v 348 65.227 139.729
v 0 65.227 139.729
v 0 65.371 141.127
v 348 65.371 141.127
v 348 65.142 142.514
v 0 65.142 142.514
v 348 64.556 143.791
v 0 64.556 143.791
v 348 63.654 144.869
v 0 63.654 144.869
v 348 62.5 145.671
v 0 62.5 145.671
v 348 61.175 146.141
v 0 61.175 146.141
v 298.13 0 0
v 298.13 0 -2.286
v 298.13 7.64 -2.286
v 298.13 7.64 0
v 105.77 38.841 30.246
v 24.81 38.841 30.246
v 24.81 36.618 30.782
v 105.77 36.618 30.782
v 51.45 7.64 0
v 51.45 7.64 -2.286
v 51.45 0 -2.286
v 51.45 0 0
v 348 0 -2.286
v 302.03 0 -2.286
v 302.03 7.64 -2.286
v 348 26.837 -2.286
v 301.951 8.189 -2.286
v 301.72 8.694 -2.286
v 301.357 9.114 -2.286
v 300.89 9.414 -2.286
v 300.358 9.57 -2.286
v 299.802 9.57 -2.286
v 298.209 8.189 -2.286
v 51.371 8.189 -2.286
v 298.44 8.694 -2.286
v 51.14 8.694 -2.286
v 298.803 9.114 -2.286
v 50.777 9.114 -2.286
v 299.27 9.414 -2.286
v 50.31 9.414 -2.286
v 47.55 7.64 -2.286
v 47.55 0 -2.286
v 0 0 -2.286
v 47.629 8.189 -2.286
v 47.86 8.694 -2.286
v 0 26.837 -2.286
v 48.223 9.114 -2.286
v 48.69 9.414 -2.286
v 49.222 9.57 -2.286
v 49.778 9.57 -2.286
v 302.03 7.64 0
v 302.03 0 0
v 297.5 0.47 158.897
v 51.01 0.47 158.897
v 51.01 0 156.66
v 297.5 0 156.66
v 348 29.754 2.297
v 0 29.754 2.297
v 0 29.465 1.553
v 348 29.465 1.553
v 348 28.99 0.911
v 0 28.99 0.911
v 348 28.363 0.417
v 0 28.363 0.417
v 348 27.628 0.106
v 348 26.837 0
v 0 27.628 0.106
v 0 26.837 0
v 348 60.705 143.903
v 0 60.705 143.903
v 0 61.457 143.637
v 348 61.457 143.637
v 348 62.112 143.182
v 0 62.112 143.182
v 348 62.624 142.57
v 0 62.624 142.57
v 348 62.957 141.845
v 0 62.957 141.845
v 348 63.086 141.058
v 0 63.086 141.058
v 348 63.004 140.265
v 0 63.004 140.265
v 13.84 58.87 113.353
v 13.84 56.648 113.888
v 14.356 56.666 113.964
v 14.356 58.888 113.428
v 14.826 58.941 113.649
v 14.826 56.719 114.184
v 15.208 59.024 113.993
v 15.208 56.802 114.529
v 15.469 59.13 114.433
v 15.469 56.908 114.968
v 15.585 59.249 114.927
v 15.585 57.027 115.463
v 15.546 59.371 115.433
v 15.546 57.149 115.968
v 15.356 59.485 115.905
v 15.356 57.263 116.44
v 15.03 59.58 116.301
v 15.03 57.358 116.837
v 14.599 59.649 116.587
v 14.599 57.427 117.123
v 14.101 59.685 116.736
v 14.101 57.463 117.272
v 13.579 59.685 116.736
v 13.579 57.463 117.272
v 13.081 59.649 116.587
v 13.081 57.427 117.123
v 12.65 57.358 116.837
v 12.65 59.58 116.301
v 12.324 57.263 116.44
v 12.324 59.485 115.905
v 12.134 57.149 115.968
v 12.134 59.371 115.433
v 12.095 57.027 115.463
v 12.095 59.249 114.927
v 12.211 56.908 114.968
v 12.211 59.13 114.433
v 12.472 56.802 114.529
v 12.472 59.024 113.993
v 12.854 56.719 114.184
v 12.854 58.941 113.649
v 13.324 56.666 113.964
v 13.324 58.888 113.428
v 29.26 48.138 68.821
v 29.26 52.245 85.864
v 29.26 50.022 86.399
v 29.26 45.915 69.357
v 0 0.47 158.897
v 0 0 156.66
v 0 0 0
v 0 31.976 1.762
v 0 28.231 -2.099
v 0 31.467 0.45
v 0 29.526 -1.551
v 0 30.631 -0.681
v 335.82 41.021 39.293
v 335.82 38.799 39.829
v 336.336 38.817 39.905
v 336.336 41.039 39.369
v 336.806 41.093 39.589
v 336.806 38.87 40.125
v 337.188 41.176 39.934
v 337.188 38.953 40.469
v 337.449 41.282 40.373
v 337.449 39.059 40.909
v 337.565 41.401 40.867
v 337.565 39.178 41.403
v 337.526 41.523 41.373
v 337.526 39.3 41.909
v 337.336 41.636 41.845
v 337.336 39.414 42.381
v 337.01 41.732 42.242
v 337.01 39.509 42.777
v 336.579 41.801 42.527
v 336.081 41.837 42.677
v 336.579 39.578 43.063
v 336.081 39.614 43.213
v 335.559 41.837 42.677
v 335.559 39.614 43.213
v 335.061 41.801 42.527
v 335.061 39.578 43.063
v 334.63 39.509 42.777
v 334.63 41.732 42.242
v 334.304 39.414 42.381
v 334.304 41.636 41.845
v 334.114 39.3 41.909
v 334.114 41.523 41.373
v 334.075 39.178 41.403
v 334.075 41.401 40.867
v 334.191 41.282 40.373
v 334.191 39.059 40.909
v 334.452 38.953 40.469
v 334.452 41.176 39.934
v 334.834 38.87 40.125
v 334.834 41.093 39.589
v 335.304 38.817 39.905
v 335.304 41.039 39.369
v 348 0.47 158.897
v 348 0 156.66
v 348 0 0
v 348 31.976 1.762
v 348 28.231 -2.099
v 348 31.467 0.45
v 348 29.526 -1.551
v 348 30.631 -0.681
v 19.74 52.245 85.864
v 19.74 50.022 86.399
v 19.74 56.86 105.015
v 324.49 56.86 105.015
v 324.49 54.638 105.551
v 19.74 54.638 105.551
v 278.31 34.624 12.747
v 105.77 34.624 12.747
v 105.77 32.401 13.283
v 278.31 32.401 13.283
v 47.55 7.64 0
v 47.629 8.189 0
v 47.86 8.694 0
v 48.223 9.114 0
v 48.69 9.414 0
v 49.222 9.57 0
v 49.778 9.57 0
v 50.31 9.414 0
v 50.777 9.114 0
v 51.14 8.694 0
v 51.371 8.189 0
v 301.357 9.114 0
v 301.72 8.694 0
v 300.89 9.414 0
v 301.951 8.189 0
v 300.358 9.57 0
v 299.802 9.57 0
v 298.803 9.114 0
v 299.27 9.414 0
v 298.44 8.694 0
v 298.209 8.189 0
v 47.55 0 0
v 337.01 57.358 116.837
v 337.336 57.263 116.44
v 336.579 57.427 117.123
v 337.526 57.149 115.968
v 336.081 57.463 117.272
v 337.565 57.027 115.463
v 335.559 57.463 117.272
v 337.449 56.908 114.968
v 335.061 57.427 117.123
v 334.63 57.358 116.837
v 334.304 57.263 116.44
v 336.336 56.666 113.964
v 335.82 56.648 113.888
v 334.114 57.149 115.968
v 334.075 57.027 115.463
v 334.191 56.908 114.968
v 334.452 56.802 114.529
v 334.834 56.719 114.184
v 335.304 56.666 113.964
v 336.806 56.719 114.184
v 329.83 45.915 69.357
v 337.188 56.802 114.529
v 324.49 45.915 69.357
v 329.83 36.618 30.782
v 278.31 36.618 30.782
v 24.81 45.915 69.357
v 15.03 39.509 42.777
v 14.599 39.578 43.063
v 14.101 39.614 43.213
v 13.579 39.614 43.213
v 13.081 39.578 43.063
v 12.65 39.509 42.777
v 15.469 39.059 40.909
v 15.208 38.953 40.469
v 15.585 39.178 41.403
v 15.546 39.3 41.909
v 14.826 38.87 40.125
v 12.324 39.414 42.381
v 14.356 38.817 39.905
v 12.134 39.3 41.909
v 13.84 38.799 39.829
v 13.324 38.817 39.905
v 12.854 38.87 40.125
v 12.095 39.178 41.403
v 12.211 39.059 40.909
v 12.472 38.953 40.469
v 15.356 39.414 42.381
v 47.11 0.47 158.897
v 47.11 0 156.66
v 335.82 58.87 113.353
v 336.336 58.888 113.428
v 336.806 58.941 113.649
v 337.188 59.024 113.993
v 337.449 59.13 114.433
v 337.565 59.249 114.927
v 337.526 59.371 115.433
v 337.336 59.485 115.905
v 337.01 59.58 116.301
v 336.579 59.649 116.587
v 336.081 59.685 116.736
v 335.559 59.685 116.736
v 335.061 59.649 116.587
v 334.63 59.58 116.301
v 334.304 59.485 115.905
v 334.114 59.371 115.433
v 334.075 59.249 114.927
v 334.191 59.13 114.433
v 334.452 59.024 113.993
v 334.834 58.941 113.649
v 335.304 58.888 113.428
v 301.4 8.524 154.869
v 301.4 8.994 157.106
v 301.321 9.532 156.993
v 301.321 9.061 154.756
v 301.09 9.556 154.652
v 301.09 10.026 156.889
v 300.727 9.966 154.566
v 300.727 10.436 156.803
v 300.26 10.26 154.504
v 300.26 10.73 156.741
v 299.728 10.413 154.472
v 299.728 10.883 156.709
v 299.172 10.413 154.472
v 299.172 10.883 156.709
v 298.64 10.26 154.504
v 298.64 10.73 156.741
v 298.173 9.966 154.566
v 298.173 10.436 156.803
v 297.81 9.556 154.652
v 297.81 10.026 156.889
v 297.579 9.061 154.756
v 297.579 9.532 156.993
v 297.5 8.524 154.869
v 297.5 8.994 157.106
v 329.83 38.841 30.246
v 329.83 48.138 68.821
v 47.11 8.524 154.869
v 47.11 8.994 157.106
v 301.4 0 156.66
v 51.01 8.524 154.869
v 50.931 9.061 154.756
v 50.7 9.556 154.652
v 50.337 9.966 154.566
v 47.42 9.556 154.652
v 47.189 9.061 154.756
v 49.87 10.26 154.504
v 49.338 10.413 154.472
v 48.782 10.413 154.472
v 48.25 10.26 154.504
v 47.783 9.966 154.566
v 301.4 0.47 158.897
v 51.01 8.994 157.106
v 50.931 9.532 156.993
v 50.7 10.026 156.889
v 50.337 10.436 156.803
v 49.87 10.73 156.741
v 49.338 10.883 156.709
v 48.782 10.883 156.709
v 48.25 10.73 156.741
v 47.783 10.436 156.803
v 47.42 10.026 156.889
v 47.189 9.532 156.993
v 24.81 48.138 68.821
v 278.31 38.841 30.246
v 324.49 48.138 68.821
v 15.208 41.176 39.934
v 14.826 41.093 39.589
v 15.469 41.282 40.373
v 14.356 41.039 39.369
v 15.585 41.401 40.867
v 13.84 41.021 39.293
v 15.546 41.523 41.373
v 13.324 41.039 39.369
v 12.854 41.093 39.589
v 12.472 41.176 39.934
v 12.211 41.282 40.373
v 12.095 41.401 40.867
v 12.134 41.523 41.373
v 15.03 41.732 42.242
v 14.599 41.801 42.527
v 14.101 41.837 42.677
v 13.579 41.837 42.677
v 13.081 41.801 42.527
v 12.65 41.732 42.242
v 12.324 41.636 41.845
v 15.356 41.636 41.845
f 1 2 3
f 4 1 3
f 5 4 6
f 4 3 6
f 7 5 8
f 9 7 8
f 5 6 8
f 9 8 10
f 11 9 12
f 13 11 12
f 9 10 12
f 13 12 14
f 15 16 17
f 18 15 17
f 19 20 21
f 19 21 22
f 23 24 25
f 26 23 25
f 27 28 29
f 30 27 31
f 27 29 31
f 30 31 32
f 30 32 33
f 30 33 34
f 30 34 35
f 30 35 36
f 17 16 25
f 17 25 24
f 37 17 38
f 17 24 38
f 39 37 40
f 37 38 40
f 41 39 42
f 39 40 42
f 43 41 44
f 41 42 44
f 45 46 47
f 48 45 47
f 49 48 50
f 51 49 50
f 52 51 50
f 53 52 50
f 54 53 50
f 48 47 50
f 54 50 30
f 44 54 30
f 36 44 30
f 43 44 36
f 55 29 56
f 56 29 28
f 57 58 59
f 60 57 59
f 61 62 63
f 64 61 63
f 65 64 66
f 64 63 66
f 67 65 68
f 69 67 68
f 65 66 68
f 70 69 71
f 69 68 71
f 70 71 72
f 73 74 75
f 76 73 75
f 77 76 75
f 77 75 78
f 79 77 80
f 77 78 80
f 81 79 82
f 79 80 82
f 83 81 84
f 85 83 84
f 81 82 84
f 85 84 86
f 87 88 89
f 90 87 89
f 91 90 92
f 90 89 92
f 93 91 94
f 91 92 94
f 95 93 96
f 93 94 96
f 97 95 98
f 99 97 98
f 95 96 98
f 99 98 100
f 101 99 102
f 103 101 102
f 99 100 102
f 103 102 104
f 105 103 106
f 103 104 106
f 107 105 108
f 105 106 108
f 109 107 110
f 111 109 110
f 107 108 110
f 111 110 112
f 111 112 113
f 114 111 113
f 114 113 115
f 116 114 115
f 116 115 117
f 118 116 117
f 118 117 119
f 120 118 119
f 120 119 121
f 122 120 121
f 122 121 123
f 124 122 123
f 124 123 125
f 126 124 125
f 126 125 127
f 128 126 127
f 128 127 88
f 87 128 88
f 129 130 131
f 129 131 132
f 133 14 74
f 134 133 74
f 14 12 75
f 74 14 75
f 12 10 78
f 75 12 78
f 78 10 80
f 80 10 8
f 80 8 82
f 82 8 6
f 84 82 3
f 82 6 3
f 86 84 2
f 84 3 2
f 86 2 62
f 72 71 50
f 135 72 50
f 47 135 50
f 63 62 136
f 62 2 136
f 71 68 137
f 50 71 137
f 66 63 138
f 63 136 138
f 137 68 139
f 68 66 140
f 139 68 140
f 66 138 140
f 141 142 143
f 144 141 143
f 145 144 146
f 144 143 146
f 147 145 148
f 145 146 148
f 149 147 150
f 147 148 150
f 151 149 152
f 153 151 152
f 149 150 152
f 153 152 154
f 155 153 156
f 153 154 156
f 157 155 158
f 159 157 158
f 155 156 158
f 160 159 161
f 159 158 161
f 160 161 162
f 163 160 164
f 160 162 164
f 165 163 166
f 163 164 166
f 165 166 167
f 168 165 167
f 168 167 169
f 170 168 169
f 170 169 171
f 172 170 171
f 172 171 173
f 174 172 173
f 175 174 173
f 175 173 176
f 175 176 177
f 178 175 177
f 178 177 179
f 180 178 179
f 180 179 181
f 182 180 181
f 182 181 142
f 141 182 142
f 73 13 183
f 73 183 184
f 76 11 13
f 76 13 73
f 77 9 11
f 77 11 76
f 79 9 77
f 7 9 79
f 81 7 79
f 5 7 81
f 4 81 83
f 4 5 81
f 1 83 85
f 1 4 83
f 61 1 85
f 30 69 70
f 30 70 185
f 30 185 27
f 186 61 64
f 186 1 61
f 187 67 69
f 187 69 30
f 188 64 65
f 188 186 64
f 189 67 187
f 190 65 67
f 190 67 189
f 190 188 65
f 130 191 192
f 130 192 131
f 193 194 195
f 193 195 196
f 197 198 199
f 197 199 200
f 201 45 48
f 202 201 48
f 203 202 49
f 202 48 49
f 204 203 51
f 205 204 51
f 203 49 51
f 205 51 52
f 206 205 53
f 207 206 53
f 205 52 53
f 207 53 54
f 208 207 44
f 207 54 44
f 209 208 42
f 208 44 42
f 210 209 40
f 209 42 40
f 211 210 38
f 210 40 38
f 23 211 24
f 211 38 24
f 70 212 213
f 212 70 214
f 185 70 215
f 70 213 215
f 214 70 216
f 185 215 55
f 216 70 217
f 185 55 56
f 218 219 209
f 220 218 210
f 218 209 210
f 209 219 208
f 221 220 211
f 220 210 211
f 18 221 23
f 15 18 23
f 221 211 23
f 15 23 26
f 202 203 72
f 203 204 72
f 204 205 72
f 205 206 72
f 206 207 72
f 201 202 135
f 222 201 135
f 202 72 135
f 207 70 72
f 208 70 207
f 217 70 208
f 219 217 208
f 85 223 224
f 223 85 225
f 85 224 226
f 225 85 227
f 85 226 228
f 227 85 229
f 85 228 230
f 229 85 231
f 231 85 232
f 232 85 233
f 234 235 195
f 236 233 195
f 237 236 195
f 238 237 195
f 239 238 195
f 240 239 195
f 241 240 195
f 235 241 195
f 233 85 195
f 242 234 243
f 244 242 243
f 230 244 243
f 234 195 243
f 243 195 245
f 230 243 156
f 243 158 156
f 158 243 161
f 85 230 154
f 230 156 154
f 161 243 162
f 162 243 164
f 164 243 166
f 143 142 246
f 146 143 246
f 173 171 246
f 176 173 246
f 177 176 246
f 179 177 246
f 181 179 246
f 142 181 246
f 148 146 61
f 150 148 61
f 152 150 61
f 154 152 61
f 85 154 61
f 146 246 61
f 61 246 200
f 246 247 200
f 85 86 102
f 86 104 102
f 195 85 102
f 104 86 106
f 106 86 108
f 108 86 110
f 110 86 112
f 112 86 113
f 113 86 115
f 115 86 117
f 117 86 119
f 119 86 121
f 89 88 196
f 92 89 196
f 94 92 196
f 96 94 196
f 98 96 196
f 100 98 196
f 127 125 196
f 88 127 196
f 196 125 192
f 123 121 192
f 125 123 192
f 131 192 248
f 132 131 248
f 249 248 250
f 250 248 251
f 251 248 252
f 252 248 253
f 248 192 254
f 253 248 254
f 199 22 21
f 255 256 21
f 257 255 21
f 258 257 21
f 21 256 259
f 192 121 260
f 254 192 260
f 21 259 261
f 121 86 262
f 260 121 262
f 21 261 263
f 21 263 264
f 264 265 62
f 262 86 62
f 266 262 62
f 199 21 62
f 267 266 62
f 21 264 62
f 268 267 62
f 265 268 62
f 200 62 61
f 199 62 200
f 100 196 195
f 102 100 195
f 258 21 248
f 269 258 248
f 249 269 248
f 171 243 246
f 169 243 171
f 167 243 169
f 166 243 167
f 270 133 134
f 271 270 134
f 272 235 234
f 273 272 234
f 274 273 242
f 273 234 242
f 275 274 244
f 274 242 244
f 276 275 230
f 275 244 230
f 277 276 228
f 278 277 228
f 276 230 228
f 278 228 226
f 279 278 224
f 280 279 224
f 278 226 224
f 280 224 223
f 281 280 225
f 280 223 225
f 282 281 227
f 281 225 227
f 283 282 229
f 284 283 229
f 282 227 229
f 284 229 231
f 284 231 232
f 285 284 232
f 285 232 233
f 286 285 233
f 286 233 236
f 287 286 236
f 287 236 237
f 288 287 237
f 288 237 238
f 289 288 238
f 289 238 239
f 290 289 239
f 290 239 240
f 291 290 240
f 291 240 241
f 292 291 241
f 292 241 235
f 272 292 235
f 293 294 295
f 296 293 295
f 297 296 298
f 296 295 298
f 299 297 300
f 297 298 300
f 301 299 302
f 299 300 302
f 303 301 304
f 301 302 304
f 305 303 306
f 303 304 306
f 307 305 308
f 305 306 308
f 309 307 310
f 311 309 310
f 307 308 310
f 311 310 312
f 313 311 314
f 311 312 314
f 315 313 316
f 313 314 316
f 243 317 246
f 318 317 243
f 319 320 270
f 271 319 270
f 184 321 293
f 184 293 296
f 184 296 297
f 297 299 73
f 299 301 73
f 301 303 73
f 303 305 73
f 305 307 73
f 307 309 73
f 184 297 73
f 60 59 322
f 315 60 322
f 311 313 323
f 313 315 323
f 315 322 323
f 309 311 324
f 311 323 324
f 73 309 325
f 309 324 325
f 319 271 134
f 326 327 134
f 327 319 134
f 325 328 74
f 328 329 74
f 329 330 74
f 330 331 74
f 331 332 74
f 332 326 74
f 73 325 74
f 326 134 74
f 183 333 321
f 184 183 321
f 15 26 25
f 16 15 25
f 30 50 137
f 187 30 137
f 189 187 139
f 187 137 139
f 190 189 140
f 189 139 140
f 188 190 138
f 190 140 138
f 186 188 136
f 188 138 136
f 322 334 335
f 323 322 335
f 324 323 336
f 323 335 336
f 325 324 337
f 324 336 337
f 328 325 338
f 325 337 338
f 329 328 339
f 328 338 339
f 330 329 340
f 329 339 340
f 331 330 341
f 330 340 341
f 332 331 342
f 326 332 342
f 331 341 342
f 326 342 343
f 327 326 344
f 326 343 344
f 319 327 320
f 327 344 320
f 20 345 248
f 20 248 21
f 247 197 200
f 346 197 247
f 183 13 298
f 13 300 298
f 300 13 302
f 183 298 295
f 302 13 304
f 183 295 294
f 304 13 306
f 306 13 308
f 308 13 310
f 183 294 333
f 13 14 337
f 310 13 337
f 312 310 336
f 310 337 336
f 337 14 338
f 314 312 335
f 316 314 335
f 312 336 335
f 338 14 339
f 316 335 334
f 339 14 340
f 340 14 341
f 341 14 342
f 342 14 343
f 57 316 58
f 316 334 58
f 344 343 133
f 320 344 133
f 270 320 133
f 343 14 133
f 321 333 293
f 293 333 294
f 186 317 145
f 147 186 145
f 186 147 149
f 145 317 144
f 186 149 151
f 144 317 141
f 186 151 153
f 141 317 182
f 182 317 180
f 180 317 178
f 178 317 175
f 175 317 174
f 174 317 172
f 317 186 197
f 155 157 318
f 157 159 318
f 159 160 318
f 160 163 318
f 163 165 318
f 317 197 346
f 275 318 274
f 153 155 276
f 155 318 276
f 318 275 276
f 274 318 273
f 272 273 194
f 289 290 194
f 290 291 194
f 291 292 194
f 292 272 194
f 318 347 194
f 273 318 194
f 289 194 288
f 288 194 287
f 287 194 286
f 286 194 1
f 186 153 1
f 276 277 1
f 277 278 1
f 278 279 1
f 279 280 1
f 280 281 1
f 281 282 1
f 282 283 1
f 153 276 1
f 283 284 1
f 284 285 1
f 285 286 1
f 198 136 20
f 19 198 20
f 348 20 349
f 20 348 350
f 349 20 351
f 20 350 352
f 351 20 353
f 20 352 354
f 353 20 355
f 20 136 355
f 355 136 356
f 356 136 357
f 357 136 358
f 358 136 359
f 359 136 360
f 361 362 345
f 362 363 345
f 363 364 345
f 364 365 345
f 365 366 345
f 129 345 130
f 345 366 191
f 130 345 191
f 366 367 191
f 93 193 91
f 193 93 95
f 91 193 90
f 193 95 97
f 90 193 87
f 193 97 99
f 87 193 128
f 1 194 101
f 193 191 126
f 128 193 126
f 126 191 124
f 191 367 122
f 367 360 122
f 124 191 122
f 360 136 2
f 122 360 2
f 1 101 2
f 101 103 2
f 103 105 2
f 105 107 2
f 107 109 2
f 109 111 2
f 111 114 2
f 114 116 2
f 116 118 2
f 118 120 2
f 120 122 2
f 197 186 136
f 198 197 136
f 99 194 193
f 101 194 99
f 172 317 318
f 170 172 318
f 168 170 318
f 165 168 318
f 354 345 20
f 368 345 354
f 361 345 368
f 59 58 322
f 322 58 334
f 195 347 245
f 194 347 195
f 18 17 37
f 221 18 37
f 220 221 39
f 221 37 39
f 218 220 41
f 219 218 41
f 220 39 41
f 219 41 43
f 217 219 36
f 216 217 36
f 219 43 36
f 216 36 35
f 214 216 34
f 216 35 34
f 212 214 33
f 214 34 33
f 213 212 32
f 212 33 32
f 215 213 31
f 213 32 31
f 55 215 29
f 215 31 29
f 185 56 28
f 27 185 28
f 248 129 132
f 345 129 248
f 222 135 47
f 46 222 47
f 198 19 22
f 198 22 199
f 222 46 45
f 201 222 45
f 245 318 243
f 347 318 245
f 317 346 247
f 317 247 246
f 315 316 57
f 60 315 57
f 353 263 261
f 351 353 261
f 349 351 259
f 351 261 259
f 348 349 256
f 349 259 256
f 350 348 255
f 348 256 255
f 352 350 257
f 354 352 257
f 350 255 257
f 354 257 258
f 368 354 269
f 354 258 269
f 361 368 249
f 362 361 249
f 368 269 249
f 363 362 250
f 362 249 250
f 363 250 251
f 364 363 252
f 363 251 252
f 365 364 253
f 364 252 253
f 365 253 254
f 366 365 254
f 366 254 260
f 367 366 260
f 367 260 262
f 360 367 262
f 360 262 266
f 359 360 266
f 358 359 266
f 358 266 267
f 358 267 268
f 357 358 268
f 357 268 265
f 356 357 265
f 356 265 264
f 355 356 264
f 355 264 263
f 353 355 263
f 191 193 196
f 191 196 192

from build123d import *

# Parameters (mm, degrees)
BASE_FLANGE1_DEPTH = 348
CUT_EXTRUDE1_REACH = 391.047
SKETCH6_R          = 1.95
CUT_EXTRUDE2_REACH = 384.238
SKETCH7_R          = 1.95
CUT_EXTRUDE3_REACH = 389.236
CUT_EXTRUDE4_REACH = 389.217
SKETCH9_R          = 1.75


# Sheet-metal steps are written as plain solids
with BuildPart() as part:
    # Sketch1 → Base-Flange1 (new body)
    with BuildSketch(Plane(origin=(0, 0, 0), x_dir=(0, 0, -1), z_dir=(1, 0, 0))):
        with BuildLine():
            Line((-156.66, 0), (-143.903368262, 60.704710735))
            ThreePointArc((-143.903368262, 60.704710735), (-142.570157767, 62.623791445), (-140.264606132, 63.004255181))
            Line((-140.264606132, 63.004255181), (-2.297114265, 29.753612482))
            ThreePointArc((-2.297114265, 29.753612482), (-0.643237686, 28.693367991), (0, 26.837116015))
            Line((0, 26.837116015), (0, 0))
            Line((0, 0), (2.286, 0))
            Line((2.286, 0), (2.286, 26.837116015))
            ThreePointArc((2.286, 26.837116015), (1.152615197, 30.107831996), (-1.761515334, 31.97598279))
            Line((-1.761515334, 31.97598279), (-139.729007202, 65.226625489))
            ThreePointArc((-139.729007202, 65.226625489), (-143.791389182, 64.556248387), (-146.140506074, 61.174828176))
            Line((-146.140506074, 61.174828176), (-158.897137813, 0.47011744))
            Line((-158.897137813, 0.47011744), (-156.66, 0))
        make_face()
    extrude(amount=BASE_FLANGE1_DEPTH)

    # Sketch6 → Cut-Extrude1 (cut, up to next)
    with BuildSketch(Plane(origin=(0, 0, -2.286), x_dir=(-1, 0, 0), z_dir=(0, 0, -1)), mode=Mode.PRIVATE) as cut_extrude1_sk1:
        with BuildLine():
            Line((-51.45, 7.64), (-51.45, 0))
            Line((-51.45, 0), (-47.55, 0))
            Line((-47.55, 0), (-47.55, 7.64))
            ThreePointArc((-47.55, 7.64), (-49.5, 5.69), (-51.45, 7.64))
        make_face()
    cut_extrude1_tool1 = extrude(cut_extrude1_sk1.sketch, amount=-CUT_EXTRUDE1_REACH, mode=Mode.PRIVATE) & part.part
    # Sketch6 → Cut-Extrude1 (cut, up to next)
    with BuildSketch(Plane(origin=(0, 0, -2.286), x_dir=(-1, 0, 0), z_dir=(0, 0, -1)), mode=Mode.PRIVATE) as cut_extrude1_sk2:
        with Locations((-49.5, 7.64)):
            Circle(SKETCH6_R)
    cut_extrude1_tool2 = extrude(cut_extrude1_sk2.sketch, amount=-CUT_EXTRUDE1_REACH, mode=Mode.PRIVATE) & part.part
    # Sketch6 → Cut-Extrude1 (cut, up to next)
    with BuildSketch(Plane(origin=(0, 0, -2.286), x_dir=(-1, 0, 0), z_dir=(0, 0, -1)), mode=Mode.PRIVATE) as cut_extrude1_sk3:
        with BuildLine():
            ThreePointArc((-298.13, 7.64), (-300.08, 5.69), (-302.03, 7.64))
            Line((-302.03, 7.64), (-302.03, 0))
            Line((-302.03, 0), (-298.13, 0))
            Line((-298.13, 0), (-298.13, 7.64))
        make_face()
    cut_extrude1_tool3 = extrude(cut_extrude1_sk3.sketch, amount=-CUT_EXTRUDE1_REACH, mode=Mode.PRIVATE) & part.part
    # Sketch6 → Cut-Extrude1 (cut, up to next)
    with BuildSketch(Plane(origin=(0, 0, -2.286), x_dir=(-1, 0, 0), z_dir=(0, 0, -1)), mode=Mode.PRIVATE) as cut_extrude1_sk4:
        with Locations((-300.08, 7.64)):
            Circle(SKETCH6_R)
    cut_extrude1_tool4 = extrude(cut_extrude1_sk4.sketch, amount=-CUT_EXTRUDE1_REACH, mode=Mode.PRIVATE) & part.part
    add(cut_extrude1_tool1.solids().sort_by_distance((49.5, 3.069742, -2.286))[0], mode=Mode.SUBTRACT)
    add(cut_extrude1_tool2.solids().sort_by_distance((49.5, 7.64, -2.286))[0], mode=Mode.SUBTRACT)
    add(cut_extrude1_tool3.solids().sort_by_distance((300.08, 3.069742, -2.286))[0], mode=Mode.SUBTRACT)
    add(cut_extrude1_tool4.solids().sort_by_distance((300.08, 7.64, -2.286))[0], mode=Mode.SUBTRACT)

    # Sketch7 → Cut-Extrude2 (cut, up to next)
    with BuildSketch(Plane(origin=(0, 31.998723581, 152.271641819), x_dir=(1, 0, 0), z_dir=(0, 0.20565067377814067, 0.9786254648100042)), mode=Mode.PRIVATE) as cut_extrude2_sk1:
        with Locations((299.45, -23.507234554)):
            Circle(SKETCH7_R)
    cut_extrude2_tool1 = extrude(cut_extrude2_sk1.sketch, amount=-CUT_EXTRUDE2_REACH, mode=Mode.PRIVATE) & part.part
    # Sketch7 → Cut-Extrude2 (cut, up to next)
    with BuildSketch(Plane(origin=(0, 31.998723581, 152.271641819), x_dir=(1, 0, 0), z_dir=(0, 0.20565067377814067, 0.9786254648100042)), mode=Mode.PRIVATE) as cut_extrude2_sk2:
        with BuildLine():
            Line((297.5, -23.507234554), (297.5, -32.217234554))
            Line((297.5, -32.217234554), (301.4, -32.217234554))
            Line((301.4, -32.217234554), (301.4, -23.507234554))
            ThreePointArc((301.4, -23.507234554), (299.45, -25.457234554), (297.5, -23.507234554))
        make_face()
    cut_extrude2_tool2 = extrude(cut_extrude2_sk2.sketch, amount=-CUT_EXTRUDE2_REACH, mode=Mode.PRIVATE) & part.part
    # Sketch7 → Cut-Extrude2 (cut, up to next)
    with BuildSketch(Plane(origin=(0, 31.998723581, 152.271641819), x_dir=(1, 0, 0), z_dir=(0, 0.20565067377814067, 0.9786254648100042)), mode=Mode.PRIVATE) as cut_extrude2_sk3:
        with Locations((49.06, -23.507234554)):
            Circle(SKETCH7_R)
    cut_extrude2_tool3 = extrude(cut_extrude2_sk3.sketch, amount=-CUT_EXTRUDE2_REACH, mode=Mode.PRIVATE) & part.part
    # Sketch7 → Cut-Extrude2 (cut, up to next)
    with BuildSketch(Plane(origin=(0, 31.998723581, 152.271641819), x_dir=(1, 0, 0), z_dir=(0, 0.20565067377814067, 0.9786254648100042)), mode=Mode.PRIVATE) as cut_extrude2_sk4:
        with BuildLine():
            ThreePointArc((51.01, -23.507234554), (49.06, -25.457234554), (47.11, -23.507234554))
            Line((47.11, -23.507234554), (47.11, -32.217234554))
            Line((47.11, -32.217234554), (51.01, -32.217234554))
            Line((51.01, -32.217234554), (51.01, -23.507234554))
        make_face()
    cut_extrude2_tool4 = extrude(cut_extrude2_sk4.sketch, amount=-CUT_EXTRUDE2_REACH, mode=Mode.PRIVATE) & part.part
    add(cut_extrude2_tool1.solids().sort_by_distance((299.45, 8.993945, 157.10592))[0], mode=Mode.SUBTRACT)
    add(cut_extrude2_tool2.solids().sort_by_distance((299.45, 3.995548, 158.156295))[0], mode=Mode.SUBTRACT)
    add(cut_extrude2_tool3.solids().sort_by_distance((49.06, 8.993945, 157.10592))[0], mode=Mode.SUBTRACT)
    add(cut_extrude2_tool4.solids().sort_by_distance((49.06, 3.995548, 158.156295))[0], mode=Mode.SUBTRACT)

    # Sketch8 → Cut-Extrude3 (cut, up to next)
    with BuildSketch(Plane(origin=(0, 29.819457861, -7.186592475), x_dir=(1, 0, 0), z_dir=(0, 0.9721654890653966, -0.23429524508670335)), mode=Mode.PRIVATE) as cut_extrude3_sk1:
        Polygon((324.49, -115.414305141), (19.74, -115.414305141), (19.74, -95.714305141), (29.26, -95.714305141), (29.26, -78.184305141), (24.81, -78.184305141), (24.81, -38.504305141), (105.77, -38.504305141), (105.77, -20.504305141), (278.31, -20.504305141), (278.31, -38.504305141), (329.83, -38.504305141), (329.83, -78.184305141), (324.49, -78.184305141), align=None)
    cut_extrude3_tool1 = extrude(cut_extrude3_sk1.sketch, amount=-CUT_EXTRUDE3_REACH, mode=Mode.PRIVATE) & part.part
    add(cut_extrude3_tool1.solids().sort_by_distance((177.78099, 46.525494, 62.132065))[0], mode=Mode.SUBTRACT)

    # Sketch9 → Cut-Extrude4 (cut, up to next)
    with BuildSketch(Plane(origin=(0, 27.597087553, -6.650993545), x_dir=(1, 0, 0), z_dir=(0, -0.9721654890653966, 0.23429524508670332)), mode=Mode.PRIVATE) as cut_extrude4_sk1:
        with Locations(Location((13.84, 125.740713464, 0), (0, 0, 270))):
            Circle(SKETCH9_R)
    cut_extrude4_tool1 = extrude(cut_extrude4_sk1.sketch, amount=-CUT_EXTRUDE4_REACH, mode=Mode.PRIVATE) & part.part
    # Sketch9 → Cut-Extrude4 (cut, up to next)
    with BuildSketch(Plane(origin=(0, 27.597087553, -6.650993545), x_dir=(1, 0, 0), z_dir=(0, -0.9721654890653966, 0.23429524508670332)), mode=Mode.PRIVATE) as cut_extrude4_sk2:
        with Locations(Location((335.82, 125.740713464, 0), (0, 0, 270))):
            Circle(SKETCH9_R)
    cut_extrude4_tool2 = extrude(cut_extrude4_sk2.sketch, amount=-CUT_EXTRUDE4_REACH, mode=Mode.PRIVATE) & part.part
    # Sketch9 → Cut-Extrude4 (cut, up to next)
    with BuildSketch(Plane(origin=(0, 27.597087553, -6.650993545), x_dir=(1, 0, 0), z_dir=(0, -0.9721654890653966, 0.23429524508670332)), mode=Mode.PRIVATE) as cut_extrude4_sk3:
        with Locations(Location((335.82, 49.560713464, 0), (0, 0, 270))):
            Circle(SKETCH9_R)
    cut_extrude4_tool3 = extrude(cut_extrude4_sk3.sketch, amount=-CUT_EXTRUDE4_REACH, mode=Mode.PRIVATE) & part.part
    # Sketch9 → Cut-Extrude4 (cut, up to next)
    with BuildSketch(Plane(origin=(0, 27.597087553, -6.650993545), x_dir=(1, 0, 0), z_dir=(0, -0.9721654890653966, 0.23429524508670332)), mode=Mode.PRIVATE) as cut_extrude4_sk4:
        with Locations(Location((13.84, 49.560713464, 0), (0, 0, 270))):
            Circle(SKETCH9_R)
    cut_extrude4_tool4 = extrude(cut_extrude4_sk4.sketch, amount=-CUT_EXTRUDE4_REACH, mode=Mode.PRIVATE) & part.part
    add(cut_extrude4_tool1.solids().sort_by_distance((13.84, 57.057539, 115.589789))[0], mode=Mode.SUBTRACT)
    add(cut_extrude4_tool2.solids().sort_by_distance((335.82, 57.057539, 115.589789))[0], mode=Mode.SUBTRACT)
    add(cut_extrude4_tool3.solids().sort_by_distance((335.82, 39.208927, 41.530222))[0], mode=Mode.SUBTRACT)
    add(cut_extrude4_tool4.solids().sort_by_distance((13.84, 39.208927, 41.530222))[0], mode=Mode.SUBTRACT)


solid = part.part
